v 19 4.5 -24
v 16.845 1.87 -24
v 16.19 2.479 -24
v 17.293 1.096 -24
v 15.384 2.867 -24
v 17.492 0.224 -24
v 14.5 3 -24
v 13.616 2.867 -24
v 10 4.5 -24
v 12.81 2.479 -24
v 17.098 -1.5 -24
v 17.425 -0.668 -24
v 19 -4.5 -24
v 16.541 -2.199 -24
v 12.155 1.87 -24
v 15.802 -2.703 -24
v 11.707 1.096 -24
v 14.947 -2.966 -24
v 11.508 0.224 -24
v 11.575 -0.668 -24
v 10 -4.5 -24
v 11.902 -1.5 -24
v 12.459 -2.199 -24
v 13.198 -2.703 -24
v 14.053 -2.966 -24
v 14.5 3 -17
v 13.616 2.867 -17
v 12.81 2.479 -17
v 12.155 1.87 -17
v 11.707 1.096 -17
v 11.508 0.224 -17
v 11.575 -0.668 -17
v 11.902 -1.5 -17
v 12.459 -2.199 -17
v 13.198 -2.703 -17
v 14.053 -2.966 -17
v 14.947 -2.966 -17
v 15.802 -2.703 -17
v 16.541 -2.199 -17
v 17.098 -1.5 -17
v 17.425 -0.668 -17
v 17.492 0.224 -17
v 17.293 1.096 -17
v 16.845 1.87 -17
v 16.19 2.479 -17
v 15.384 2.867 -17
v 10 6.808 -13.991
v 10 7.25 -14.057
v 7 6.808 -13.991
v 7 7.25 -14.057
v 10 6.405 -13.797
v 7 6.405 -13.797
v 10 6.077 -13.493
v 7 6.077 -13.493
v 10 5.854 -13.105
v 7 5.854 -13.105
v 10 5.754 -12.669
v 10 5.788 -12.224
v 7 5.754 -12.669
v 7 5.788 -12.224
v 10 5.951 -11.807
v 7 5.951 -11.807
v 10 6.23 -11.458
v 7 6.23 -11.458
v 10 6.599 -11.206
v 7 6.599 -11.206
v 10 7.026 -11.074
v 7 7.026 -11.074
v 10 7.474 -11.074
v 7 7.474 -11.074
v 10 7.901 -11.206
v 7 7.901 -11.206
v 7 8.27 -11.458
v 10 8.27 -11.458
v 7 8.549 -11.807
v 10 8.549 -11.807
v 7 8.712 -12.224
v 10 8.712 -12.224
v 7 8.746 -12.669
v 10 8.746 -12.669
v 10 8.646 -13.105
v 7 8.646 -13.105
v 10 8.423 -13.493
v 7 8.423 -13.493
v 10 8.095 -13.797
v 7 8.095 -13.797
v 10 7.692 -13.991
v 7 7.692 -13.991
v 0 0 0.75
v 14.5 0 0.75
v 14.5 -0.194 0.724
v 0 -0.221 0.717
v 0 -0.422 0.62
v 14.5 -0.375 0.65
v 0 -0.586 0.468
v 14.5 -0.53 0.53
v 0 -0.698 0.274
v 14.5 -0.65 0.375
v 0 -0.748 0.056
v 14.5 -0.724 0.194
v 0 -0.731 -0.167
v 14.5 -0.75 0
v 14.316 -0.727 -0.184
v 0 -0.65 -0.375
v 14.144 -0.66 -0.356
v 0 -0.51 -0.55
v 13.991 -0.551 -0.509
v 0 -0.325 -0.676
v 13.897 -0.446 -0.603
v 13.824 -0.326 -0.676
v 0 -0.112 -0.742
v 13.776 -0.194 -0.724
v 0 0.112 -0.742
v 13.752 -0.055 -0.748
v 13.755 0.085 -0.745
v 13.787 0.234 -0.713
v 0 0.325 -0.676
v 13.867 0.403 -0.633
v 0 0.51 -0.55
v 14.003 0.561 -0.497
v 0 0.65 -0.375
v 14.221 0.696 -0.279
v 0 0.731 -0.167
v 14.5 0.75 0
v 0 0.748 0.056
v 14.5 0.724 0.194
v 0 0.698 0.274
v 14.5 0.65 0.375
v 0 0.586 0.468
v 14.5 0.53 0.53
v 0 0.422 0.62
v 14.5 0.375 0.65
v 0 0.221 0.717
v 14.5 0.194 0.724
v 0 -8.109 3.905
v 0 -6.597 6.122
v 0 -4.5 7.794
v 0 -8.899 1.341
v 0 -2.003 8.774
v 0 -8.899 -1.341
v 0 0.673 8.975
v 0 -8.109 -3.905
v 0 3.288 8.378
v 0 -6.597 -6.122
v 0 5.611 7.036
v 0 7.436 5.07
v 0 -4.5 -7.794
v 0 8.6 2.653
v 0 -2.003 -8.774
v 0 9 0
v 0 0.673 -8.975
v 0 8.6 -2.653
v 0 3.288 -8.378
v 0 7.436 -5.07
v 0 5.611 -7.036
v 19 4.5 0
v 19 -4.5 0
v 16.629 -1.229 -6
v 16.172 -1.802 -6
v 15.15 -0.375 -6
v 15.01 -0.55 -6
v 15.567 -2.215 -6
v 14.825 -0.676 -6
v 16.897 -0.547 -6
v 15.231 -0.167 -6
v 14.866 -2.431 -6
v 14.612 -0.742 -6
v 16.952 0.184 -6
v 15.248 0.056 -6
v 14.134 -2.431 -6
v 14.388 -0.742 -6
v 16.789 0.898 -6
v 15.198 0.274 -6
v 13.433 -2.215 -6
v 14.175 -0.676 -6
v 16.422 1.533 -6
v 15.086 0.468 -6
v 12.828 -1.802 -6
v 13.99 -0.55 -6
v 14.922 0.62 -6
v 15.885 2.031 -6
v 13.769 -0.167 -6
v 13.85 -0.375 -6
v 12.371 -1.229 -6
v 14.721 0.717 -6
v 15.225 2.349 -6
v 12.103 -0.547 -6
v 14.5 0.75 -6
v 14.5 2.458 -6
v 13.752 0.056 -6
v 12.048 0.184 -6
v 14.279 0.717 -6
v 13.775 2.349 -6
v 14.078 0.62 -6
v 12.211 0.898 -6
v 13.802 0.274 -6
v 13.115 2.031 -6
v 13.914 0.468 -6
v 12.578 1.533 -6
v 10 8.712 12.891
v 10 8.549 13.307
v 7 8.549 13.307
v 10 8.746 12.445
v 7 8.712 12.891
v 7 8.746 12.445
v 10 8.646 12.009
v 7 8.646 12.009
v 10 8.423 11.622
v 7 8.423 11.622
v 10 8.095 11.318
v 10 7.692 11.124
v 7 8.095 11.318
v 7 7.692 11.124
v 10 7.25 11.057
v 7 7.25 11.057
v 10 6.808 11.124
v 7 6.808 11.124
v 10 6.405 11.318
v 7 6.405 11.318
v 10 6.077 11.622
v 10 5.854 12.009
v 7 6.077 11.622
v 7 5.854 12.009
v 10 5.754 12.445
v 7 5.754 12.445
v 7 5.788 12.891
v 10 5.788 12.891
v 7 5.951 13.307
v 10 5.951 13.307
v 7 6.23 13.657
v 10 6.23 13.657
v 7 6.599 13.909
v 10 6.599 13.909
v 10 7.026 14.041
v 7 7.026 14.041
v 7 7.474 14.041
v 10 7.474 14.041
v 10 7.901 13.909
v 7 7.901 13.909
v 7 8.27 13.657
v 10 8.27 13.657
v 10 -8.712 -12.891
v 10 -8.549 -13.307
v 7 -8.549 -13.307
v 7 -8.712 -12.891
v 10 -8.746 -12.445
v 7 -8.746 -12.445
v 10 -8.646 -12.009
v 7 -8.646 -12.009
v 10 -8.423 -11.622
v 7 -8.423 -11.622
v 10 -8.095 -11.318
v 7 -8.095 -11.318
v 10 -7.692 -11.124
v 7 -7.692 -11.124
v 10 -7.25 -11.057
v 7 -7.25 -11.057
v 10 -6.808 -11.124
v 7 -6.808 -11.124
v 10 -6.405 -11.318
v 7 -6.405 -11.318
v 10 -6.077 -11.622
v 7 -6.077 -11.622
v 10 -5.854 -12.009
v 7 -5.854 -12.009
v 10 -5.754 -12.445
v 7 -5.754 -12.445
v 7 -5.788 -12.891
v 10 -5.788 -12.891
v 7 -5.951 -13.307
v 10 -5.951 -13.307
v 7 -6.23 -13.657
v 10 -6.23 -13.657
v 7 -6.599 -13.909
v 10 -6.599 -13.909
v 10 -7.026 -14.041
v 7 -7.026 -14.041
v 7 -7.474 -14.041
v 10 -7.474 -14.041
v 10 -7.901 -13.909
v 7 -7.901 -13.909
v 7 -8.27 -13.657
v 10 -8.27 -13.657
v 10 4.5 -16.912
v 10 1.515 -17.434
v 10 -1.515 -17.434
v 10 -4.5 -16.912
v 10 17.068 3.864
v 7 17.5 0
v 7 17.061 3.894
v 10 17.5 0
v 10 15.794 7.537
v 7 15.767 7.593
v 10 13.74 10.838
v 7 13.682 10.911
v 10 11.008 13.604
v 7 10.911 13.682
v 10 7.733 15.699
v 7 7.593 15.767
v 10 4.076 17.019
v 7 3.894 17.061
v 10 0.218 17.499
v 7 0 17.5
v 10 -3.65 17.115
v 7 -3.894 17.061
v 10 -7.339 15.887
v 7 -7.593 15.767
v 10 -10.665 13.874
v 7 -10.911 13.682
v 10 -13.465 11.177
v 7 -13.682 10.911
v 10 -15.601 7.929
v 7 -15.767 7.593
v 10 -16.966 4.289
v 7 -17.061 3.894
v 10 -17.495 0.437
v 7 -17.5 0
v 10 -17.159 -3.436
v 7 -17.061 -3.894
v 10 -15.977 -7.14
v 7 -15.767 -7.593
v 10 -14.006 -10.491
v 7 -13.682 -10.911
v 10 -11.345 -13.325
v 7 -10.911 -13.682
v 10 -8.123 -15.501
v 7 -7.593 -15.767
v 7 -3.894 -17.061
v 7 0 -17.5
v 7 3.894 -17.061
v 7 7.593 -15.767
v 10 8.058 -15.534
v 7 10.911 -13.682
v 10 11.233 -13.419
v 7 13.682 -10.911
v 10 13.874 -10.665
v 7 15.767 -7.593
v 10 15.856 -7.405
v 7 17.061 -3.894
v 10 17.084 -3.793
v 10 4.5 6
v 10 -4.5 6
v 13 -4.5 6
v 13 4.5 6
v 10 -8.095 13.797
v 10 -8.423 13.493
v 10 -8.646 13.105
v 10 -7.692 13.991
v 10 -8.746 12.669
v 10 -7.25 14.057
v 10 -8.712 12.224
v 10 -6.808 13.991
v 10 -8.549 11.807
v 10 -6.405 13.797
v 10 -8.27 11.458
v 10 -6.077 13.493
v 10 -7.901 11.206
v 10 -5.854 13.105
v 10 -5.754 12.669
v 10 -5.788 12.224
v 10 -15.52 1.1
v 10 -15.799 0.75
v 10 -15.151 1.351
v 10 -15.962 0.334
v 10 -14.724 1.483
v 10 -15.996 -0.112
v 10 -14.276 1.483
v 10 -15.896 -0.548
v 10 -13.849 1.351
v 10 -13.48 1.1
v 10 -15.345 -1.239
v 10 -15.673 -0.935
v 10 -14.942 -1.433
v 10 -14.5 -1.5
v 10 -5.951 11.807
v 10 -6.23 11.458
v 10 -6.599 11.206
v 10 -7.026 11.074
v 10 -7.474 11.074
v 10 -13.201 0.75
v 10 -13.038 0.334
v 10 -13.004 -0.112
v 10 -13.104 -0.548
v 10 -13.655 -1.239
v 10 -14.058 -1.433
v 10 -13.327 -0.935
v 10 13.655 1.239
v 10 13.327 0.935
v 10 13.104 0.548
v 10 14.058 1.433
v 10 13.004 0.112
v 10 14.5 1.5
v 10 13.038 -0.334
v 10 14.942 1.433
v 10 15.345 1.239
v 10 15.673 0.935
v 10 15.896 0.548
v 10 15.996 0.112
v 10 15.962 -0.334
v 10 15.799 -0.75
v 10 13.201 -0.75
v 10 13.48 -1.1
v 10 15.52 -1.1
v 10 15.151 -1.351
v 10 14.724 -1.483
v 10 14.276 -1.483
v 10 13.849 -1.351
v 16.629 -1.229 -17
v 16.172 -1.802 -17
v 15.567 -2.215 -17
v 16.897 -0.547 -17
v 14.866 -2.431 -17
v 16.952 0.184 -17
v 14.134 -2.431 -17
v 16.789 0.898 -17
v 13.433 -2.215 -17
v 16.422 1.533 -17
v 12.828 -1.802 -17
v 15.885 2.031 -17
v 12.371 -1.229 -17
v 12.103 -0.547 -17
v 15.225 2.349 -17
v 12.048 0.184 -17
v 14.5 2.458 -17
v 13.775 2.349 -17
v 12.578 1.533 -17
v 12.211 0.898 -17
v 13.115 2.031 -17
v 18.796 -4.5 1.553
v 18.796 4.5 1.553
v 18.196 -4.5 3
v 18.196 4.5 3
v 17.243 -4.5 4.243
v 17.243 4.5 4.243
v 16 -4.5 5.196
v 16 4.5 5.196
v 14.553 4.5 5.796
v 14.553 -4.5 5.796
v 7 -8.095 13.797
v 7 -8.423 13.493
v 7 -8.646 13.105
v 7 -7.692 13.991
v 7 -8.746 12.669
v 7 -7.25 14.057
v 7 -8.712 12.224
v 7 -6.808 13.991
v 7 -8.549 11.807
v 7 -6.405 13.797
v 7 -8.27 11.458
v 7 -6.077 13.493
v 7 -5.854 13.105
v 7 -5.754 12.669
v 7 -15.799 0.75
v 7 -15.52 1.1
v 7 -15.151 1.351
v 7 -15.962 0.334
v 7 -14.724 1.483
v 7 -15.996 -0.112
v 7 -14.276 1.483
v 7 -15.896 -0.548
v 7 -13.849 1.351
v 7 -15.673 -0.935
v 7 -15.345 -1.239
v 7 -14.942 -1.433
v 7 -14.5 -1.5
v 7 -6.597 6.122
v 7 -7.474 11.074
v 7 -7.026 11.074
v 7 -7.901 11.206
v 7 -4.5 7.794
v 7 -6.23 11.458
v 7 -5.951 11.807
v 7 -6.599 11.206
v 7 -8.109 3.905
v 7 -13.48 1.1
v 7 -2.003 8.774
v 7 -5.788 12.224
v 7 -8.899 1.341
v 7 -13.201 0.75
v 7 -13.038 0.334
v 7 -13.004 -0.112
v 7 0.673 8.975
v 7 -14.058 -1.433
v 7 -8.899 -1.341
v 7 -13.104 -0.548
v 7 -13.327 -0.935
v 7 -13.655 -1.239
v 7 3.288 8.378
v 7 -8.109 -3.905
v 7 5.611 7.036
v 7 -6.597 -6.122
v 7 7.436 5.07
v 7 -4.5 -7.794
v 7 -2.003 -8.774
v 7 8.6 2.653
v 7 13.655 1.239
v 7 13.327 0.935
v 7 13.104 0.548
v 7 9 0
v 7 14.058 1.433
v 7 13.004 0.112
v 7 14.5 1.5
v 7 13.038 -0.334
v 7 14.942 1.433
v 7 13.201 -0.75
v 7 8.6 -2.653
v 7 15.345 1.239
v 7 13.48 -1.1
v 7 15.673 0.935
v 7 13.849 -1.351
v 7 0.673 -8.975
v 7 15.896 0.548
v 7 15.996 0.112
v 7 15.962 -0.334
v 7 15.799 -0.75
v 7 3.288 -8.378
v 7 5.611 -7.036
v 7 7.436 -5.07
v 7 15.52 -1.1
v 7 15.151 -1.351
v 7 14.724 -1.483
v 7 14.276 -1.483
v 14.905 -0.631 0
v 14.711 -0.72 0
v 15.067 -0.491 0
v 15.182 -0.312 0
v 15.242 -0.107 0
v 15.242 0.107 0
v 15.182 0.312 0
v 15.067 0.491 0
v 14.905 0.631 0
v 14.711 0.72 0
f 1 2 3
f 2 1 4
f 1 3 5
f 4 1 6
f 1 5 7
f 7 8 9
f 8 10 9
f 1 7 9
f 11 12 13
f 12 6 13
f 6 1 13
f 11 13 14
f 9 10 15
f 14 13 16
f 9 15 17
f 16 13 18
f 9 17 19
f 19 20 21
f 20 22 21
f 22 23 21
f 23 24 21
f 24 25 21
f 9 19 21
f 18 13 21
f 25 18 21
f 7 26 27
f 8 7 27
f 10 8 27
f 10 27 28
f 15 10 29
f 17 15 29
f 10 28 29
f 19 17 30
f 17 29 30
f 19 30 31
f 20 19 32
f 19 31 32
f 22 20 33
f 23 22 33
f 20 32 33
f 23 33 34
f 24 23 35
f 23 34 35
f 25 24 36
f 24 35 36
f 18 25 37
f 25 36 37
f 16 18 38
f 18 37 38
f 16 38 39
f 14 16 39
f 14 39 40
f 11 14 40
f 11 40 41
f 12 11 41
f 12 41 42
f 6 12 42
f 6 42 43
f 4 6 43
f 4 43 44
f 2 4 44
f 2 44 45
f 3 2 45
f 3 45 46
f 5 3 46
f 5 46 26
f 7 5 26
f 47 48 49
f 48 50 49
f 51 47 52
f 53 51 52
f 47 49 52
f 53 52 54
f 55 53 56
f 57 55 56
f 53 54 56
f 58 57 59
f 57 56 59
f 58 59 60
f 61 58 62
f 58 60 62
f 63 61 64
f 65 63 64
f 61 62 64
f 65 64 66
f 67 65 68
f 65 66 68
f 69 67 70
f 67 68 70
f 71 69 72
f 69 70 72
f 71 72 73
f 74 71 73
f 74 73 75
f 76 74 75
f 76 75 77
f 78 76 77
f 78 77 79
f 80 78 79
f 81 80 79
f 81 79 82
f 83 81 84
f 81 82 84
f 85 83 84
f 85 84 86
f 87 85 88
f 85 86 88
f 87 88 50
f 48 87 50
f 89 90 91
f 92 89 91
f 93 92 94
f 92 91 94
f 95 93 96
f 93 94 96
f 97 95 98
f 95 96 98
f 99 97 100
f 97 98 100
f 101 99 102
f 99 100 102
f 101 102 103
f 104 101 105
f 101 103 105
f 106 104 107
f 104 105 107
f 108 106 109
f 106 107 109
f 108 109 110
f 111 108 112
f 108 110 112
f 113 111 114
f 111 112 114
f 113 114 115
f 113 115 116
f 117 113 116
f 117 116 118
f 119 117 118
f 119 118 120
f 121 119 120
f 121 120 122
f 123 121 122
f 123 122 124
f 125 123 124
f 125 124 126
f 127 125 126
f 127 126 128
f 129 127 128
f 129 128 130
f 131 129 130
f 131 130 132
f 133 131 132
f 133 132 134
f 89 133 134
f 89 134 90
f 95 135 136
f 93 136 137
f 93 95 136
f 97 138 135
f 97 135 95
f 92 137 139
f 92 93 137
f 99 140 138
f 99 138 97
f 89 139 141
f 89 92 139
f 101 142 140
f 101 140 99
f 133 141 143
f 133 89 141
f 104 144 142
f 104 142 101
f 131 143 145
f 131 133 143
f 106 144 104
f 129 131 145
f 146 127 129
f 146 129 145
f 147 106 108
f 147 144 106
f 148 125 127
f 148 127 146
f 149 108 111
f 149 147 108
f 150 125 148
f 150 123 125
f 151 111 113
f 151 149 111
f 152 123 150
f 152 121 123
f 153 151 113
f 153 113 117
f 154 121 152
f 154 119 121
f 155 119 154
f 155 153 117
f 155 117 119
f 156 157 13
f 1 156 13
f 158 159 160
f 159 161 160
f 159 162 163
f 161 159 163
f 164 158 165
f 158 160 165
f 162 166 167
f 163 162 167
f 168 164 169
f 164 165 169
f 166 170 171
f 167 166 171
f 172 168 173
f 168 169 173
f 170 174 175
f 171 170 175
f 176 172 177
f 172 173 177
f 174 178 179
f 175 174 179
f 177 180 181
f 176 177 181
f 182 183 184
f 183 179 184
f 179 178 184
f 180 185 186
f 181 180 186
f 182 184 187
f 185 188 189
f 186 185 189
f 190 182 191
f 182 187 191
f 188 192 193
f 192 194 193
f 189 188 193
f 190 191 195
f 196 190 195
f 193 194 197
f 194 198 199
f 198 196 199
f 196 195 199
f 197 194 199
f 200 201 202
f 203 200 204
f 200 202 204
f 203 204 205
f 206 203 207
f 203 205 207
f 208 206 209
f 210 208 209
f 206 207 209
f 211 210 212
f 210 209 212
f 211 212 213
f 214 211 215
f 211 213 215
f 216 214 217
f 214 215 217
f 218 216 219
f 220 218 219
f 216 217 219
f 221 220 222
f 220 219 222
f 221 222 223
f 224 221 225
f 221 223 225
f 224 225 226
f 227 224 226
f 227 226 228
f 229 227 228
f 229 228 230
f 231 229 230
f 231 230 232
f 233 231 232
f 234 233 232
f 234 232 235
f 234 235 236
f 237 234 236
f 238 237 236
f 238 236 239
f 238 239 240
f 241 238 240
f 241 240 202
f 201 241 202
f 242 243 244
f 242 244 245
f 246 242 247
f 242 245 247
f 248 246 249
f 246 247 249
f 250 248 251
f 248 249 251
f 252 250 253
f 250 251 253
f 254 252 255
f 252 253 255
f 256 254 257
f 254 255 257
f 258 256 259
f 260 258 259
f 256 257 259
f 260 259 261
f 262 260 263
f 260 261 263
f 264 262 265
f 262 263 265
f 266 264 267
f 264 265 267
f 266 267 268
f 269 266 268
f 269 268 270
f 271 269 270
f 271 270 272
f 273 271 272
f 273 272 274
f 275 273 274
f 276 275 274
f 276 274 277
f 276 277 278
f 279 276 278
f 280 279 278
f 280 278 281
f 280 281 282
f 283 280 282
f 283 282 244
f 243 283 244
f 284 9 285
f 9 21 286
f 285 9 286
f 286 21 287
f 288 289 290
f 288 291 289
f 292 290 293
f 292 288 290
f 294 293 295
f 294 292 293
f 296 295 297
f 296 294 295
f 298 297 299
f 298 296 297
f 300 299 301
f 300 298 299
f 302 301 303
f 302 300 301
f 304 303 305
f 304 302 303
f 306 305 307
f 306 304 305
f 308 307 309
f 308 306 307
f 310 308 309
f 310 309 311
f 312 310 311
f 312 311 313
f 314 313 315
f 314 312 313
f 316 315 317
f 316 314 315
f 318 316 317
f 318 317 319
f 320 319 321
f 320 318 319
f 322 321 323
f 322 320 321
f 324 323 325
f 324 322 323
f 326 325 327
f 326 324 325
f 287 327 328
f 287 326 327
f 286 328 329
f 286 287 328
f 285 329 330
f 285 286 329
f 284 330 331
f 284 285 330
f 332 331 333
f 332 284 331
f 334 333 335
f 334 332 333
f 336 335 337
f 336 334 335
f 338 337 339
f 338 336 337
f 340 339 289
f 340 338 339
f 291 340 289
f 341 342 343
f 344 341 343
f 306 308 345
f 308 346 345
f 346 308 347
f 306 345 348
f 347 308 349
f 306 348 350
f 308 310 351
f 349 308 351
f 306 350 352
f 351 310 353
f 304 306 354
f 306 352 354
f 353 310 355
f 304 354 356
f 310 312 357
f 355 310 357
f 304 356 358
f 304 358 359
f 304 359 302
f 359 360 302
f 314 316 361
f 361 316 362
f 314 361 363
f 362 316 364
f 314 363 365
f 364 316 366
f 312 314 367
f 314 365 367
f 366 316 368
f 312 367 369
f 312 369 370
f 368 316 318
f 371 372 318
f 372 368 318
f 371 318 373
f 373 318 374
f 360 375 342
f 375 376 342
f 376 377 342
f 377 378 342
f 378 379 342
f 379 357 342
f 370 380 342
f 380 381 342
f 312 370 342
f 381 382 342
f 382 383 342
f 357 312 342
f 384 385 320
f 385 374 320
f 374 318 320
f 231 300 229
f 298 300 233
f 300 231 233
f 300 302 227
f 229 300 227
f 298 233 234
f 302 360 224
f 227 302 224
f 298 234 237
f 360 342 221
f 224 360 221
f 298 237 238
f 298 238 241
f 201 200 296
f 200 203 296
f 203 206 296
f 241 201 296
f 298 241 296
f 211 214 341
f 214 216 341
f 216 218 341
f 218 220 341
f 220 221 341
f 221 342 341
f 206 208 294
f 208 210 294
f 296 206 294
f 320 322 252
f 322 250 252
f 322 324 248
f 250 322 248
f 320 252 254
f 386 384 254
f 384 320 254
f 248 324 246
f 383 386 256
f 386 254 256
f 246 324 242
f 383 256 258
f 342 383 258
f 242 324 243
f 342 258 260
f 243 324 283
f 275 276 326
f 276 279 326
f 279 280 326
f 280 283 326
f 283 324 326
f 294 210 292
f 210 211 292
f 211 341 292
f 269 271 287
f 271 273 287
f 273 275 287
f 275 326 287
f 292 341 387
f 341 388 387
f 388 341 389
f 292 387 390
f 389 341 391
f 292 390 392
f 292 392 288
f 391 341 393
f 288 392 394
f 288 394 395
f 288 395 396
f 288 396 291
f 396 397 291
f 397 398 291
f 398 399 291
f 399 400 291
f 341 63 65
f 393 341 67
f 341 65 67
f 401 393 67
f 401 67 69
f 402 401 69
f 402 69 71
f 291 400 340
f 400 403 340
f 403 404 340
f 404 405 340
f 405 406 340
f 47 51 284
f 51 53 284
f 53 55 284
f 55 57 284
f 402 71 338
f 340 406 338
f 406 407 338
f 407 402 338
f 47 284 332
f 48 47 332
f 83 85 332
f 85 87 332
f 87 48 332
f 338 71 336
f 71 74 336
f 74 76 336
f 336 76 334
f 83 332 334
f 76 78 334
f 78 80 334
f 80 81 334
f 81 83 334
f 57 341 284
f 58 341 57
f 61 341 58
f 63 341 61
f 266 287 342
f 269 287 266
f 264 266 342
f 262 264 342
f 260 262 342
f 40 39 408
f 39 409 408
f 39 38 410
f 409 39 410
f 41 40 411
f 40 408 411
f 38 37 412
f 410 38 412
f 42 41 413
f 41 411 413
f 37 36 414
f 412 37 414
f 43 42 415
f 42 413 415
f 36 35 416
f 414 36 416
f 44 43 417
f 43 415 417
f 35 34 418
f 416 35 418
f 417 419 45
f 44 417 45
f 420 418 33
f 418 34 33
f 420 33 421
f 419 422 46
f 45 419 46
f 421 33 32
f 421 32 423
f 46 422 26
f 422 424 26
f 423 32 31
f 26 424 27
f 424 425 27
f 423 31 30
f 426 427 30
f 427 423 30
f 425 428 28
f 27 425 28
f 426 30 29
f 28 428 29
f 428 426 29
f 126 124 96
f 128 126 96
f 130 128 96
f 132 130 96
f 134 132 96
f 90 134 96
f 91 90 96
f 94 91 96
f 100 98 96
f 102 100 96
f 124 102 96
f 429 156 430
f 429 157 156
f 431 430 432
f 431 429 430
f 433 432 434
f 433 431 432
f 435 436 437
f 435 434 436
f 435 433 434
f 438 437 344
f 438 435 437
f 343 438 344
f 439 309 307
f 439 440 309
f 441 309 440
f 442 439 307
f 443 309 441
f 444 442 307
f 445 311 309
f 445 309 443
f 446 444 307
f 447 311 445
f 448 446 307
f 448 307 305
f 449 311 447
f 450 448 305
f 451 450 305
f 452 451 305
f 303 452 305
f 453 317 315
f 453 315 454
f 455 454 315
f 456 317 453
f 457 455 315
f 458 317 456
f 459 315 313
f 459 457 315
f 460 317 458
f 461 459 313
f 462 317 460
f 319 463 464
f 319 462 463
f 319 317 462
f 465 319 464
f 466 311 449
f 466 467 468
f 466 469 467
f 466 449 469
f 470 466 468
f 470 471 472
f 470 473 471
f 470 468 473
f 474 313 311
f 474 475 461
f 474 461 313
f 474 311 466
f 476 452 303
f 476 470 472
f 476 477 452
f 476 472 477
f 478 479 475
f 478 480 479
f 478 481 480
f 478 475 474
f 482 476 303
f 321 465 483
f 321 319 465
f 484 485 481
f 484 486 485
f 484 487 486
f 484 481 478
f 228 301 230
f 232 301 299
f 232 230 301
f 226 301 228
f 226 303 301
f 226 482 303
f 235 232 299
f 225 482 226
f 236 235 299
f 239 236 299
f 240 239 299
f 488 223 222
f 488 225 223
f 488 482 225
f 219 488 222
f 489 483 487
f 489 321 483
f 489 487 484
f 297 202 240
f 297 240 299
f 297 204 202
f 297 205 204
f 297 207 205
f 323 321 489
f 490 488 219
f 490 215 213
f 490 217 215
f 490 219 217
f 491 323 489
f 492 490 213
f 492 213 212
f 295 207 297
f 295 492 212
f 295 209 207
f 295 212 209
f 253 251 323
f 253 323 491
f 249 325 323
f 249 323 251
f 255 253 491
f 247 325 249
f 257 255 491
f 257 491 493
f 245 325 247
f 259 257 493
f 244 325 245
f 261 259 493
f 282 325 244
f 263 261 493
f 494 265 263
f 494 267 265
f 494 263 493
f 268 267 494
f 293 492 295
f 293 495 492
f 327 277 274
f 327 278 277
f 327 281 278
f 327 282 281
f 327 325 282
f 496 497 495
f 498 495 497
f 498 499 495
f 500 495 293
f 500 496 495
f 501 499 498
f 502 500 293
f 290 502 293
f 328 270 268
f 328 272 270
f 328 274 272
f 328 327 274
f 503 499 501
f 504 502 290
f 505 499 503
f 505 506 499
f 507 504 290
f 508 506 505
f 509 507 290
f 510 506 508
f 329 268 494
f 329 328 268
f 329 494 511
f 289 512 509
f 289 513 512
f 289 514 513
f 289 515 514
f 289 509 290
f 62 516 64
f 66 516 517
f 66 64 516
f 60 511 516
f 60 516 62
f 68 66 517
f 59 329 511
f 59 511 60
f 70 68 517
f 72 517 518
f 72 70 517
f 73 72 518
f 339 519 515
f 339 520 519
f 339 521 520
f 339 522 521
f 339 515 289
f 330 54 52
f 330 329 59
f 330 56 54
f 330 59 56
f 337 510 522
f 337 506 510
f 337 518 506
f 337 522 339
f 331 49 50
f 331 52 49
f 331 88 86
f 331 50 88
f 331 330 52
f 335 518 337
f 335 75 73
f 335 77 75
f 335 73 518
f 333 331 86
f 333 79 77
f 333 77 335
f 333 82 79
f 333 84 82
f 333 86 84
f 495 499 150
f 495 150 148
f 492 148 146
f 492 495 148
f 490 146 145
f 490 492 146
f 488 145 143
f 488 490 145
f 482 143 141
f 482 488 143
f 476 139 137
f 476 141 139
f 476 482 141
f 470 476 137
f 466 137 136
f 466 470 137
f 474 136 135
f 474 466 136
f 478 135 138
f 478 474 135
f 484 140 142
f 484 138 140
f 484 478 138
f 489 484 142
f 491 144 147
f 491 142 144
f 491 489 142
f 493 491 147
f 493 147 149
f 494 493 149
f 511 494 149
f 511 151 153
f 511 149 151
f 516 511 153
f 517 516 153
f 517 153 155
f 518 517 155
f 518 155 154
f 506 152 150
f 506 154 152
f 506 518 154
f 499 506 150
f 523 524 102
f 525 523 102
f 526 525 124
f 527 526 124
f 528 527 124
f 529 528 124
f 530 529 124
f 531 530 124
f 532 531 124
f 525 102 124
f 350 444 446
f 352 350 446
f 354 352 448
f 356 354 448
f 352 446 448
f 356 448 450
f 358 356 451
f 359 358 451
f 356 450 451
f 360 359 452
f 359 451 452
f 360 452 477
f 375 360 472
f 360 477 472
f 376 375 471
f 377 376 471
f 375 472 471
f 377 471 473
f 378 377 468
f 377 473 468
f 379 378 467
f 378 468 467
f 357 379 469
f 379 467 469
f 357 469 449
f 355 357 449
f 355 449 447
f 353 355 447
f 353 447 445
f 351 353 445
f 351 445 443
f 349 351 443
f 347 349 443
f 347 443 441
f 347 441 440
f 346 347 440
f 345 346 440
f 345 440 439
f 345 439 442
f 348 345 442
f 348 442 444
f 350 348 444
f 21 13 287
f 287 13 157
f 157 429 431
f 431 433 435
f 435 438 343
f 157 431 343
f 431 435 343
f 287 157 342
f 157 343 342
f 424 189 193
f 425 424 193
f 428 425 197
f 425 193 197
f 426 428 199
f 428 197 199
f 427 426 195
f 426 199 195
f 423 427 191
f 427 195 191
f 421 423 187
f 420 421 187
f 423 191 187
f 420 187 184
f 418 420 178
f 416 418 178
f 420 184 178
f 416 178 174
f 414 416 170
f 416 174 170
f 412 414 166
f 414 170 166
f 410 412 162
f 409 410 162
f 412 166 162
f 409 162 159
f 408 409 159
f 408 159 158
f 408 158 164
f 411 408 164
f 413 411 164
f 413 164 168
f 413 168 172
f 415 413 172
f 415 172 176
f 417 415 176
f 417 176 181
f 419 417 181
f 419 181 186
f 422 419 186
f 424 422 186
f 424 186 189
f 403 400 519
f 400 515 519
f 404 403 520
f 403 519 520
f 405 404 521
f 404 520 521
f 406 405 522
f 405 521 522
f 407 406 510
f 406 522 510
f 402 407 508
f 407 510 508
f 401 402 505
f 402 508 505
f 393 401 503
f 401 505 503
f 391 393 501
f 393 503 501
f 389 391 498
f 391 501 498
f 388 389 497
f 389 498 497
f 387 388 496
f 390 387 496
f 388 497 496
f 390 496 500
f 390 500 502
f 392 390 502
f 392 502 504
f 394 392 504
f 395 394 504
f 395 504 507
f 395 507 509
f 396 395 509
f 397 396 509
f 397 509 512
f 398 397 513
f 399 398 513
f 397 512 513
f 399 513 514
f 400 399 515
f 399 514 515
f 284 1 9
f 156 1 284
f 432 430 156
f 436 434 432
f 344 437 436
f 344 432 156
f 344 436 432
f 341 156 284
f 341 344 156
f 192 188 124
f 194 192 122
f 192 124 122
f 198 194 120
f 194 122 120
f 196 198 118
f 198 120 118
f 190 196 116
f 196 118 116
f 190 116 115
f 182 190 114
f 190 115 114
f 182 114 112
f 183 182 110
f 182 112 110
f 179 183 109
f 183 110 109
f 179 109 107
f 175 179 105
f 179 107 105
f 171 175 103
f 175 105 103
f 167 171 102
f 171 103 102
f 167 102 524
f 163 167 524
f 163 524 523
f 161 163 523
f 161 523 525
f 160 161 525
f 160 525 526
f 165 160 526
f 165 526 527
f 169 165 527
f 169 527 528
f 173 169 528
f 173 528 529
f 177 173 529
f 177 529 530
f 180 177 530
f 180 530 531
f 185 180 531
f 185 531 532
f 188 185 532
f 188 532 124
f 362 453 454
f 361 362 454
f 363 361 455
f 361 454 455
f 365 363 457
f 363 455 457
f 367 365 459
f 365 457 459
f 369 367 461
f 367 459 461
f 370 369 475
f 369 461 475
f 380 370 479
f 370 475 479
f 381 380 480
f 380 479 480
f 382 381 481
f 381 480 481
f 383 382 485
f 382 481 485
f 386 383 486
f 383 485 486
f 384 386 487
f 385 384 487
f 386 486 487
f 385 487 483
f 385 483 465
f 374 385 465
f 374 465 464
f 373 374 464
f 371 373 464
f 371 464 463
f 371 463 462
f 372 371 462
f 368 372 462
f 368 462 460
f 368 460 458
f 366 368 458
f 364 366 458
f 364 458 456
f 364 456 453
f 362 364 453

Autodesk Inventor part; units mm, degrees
ref_plane "YZ Plane" through (0, 0, 0) normal (1, 0, 0) x (0, 1, 0)
ref_plane "XZ Plane" through (0, 0, 0) normal (0, 1, 0) x (-1, 0, 0)
sketch "Sketch1" plane through (0, 0, 0) normal (0, 0, 1) x (1, 0, 0)
  line L0 (0, 0) -> (0, 9)
  line L1 (0, 9) -> (7, 9)
  line L2 (7, 9) -> (7, 17.5)
  line L3 (7, 17.5) -> (10, 17.5)
  line L4 (10, 17.5) -> (10, 0)
  line L5 (10, 0) -> (0, 0)
  dimension "d0" = 18
  dimension "d1" = 35
  dimension "d2" = 7
  dimension "d3" = 3
revolve "Revolution1" add sketch "Sketch1" angle 360 about axis through (10, 0, 0) along (-1, 0, 0)
sketch "Sketch2" plane through (0, 0, 0) normal (0, 1, 0) x (-1, 0, 0)
  line L0 (-10, -17.5) -> (-10, 17.5) projected
  line L1 (-10, 6) -> (-13, 6)
  line L2 (-19, 0) -> (-19, -24)
  line L3 (-19, -24) -> (-10, -24)
  line L4 (-10, -24) -> (-10, 6)
  line L5 (-10, -17.5) -> (-7, -17.5) projected
  arc A0 (-13, 6) -> (-19, 0) centre (-13, 0) ccw
  point P0 (0, 0)
  point P1 (-8.5, -17.5)
  dimension "d6" = 30
  dimension "d7" = 9
  dimension "d8" = 6.5
  dimension "d9" = 6
extrude "Extrusion1" add sketch "Sketch2" along normal mid plane 9
sketch "Sketch3" plane through (19, 4.5, -24) normal (0, 0, -1) x (-1, 0, 0)
  line L0 (9, 0) -> (9, -9) projected
  line L1 (0, 0) -> (9, 0) projected
  point P0 (19, -4.5)
  point P1 (4.5, -4.5)
  point P2 (9, -4.5)
  dimension "d19" = 4.5
  dimension "d20" = 4.5
hole "Hole1" at (14.5, 0, -24) direction (0, 0, 1) diameter 4.917 depth 18 counterbore diameter 6 counterbore depth 7 thread size "M6x1" class "6H" standard "ISO Metric profile"
ref_plane "Work Plane1" through (0, 0, -7.5) normal (0, 0, 1) x (1, 0, 0)
sketch "Sketch4" plane through (0, 0, -7.5) normal (0, 0, 1) x (1, 0, 0)
  circle A0 centre (14.5, 0) radius 3 projected
  point P0 (0, 0)
hole "Hole2" at (14.5, 0, -7.5) direction (0, 0, 1) diameter 1.5 depth 7.5
sketch "Sketch5" plane through (10, 0, 0) normal (1, 0, 0) x (0, 0, -1)
  line L0 (-6, 4.5) -> (16.9115, 4.5) projected
  arc A0 (16.9115, 4.5) -> (16.9115, -4.5) centre (0, 0) ccw projected
  line L1 (16.9115, -4.5) -> (-6, -4.5) projected
  line L2 (-6, -4.5) -> (-6, 4.5) projected
  circle A1 centre (0, 0) radius 14.5 construction
  line L3 (0, -4.5) -> (0, 4.5) projected
  line L4 (0, 0) -> (12.5574, 7.25) construction
  line L5 (0, 0) -> (27.6817, 0) construction
  dimension "d29" = 29
  dimension "d30" = 30
hole "Hole3" at (10, 7.25, -12.5574) direction (-1, 0, 0) diameter 3 depth 3
pattern_circular "Circular Pattern1" count 6 over 360 about axis through (8.5, 0, 0) along (-1, 0, 0) of "Hole3"
sketch "Sketch6" plane through (0, 0, 0) normal (-1, 0, 0) x (0, 0, 1)
  circle A0 centre (0, 0) radius 9 projected
hole "Hole4" at (0, 0, 0) direction (1, 0, 0) diameter 1.5 depth 14.5
properties part number "155 part 1" material "Gold"
